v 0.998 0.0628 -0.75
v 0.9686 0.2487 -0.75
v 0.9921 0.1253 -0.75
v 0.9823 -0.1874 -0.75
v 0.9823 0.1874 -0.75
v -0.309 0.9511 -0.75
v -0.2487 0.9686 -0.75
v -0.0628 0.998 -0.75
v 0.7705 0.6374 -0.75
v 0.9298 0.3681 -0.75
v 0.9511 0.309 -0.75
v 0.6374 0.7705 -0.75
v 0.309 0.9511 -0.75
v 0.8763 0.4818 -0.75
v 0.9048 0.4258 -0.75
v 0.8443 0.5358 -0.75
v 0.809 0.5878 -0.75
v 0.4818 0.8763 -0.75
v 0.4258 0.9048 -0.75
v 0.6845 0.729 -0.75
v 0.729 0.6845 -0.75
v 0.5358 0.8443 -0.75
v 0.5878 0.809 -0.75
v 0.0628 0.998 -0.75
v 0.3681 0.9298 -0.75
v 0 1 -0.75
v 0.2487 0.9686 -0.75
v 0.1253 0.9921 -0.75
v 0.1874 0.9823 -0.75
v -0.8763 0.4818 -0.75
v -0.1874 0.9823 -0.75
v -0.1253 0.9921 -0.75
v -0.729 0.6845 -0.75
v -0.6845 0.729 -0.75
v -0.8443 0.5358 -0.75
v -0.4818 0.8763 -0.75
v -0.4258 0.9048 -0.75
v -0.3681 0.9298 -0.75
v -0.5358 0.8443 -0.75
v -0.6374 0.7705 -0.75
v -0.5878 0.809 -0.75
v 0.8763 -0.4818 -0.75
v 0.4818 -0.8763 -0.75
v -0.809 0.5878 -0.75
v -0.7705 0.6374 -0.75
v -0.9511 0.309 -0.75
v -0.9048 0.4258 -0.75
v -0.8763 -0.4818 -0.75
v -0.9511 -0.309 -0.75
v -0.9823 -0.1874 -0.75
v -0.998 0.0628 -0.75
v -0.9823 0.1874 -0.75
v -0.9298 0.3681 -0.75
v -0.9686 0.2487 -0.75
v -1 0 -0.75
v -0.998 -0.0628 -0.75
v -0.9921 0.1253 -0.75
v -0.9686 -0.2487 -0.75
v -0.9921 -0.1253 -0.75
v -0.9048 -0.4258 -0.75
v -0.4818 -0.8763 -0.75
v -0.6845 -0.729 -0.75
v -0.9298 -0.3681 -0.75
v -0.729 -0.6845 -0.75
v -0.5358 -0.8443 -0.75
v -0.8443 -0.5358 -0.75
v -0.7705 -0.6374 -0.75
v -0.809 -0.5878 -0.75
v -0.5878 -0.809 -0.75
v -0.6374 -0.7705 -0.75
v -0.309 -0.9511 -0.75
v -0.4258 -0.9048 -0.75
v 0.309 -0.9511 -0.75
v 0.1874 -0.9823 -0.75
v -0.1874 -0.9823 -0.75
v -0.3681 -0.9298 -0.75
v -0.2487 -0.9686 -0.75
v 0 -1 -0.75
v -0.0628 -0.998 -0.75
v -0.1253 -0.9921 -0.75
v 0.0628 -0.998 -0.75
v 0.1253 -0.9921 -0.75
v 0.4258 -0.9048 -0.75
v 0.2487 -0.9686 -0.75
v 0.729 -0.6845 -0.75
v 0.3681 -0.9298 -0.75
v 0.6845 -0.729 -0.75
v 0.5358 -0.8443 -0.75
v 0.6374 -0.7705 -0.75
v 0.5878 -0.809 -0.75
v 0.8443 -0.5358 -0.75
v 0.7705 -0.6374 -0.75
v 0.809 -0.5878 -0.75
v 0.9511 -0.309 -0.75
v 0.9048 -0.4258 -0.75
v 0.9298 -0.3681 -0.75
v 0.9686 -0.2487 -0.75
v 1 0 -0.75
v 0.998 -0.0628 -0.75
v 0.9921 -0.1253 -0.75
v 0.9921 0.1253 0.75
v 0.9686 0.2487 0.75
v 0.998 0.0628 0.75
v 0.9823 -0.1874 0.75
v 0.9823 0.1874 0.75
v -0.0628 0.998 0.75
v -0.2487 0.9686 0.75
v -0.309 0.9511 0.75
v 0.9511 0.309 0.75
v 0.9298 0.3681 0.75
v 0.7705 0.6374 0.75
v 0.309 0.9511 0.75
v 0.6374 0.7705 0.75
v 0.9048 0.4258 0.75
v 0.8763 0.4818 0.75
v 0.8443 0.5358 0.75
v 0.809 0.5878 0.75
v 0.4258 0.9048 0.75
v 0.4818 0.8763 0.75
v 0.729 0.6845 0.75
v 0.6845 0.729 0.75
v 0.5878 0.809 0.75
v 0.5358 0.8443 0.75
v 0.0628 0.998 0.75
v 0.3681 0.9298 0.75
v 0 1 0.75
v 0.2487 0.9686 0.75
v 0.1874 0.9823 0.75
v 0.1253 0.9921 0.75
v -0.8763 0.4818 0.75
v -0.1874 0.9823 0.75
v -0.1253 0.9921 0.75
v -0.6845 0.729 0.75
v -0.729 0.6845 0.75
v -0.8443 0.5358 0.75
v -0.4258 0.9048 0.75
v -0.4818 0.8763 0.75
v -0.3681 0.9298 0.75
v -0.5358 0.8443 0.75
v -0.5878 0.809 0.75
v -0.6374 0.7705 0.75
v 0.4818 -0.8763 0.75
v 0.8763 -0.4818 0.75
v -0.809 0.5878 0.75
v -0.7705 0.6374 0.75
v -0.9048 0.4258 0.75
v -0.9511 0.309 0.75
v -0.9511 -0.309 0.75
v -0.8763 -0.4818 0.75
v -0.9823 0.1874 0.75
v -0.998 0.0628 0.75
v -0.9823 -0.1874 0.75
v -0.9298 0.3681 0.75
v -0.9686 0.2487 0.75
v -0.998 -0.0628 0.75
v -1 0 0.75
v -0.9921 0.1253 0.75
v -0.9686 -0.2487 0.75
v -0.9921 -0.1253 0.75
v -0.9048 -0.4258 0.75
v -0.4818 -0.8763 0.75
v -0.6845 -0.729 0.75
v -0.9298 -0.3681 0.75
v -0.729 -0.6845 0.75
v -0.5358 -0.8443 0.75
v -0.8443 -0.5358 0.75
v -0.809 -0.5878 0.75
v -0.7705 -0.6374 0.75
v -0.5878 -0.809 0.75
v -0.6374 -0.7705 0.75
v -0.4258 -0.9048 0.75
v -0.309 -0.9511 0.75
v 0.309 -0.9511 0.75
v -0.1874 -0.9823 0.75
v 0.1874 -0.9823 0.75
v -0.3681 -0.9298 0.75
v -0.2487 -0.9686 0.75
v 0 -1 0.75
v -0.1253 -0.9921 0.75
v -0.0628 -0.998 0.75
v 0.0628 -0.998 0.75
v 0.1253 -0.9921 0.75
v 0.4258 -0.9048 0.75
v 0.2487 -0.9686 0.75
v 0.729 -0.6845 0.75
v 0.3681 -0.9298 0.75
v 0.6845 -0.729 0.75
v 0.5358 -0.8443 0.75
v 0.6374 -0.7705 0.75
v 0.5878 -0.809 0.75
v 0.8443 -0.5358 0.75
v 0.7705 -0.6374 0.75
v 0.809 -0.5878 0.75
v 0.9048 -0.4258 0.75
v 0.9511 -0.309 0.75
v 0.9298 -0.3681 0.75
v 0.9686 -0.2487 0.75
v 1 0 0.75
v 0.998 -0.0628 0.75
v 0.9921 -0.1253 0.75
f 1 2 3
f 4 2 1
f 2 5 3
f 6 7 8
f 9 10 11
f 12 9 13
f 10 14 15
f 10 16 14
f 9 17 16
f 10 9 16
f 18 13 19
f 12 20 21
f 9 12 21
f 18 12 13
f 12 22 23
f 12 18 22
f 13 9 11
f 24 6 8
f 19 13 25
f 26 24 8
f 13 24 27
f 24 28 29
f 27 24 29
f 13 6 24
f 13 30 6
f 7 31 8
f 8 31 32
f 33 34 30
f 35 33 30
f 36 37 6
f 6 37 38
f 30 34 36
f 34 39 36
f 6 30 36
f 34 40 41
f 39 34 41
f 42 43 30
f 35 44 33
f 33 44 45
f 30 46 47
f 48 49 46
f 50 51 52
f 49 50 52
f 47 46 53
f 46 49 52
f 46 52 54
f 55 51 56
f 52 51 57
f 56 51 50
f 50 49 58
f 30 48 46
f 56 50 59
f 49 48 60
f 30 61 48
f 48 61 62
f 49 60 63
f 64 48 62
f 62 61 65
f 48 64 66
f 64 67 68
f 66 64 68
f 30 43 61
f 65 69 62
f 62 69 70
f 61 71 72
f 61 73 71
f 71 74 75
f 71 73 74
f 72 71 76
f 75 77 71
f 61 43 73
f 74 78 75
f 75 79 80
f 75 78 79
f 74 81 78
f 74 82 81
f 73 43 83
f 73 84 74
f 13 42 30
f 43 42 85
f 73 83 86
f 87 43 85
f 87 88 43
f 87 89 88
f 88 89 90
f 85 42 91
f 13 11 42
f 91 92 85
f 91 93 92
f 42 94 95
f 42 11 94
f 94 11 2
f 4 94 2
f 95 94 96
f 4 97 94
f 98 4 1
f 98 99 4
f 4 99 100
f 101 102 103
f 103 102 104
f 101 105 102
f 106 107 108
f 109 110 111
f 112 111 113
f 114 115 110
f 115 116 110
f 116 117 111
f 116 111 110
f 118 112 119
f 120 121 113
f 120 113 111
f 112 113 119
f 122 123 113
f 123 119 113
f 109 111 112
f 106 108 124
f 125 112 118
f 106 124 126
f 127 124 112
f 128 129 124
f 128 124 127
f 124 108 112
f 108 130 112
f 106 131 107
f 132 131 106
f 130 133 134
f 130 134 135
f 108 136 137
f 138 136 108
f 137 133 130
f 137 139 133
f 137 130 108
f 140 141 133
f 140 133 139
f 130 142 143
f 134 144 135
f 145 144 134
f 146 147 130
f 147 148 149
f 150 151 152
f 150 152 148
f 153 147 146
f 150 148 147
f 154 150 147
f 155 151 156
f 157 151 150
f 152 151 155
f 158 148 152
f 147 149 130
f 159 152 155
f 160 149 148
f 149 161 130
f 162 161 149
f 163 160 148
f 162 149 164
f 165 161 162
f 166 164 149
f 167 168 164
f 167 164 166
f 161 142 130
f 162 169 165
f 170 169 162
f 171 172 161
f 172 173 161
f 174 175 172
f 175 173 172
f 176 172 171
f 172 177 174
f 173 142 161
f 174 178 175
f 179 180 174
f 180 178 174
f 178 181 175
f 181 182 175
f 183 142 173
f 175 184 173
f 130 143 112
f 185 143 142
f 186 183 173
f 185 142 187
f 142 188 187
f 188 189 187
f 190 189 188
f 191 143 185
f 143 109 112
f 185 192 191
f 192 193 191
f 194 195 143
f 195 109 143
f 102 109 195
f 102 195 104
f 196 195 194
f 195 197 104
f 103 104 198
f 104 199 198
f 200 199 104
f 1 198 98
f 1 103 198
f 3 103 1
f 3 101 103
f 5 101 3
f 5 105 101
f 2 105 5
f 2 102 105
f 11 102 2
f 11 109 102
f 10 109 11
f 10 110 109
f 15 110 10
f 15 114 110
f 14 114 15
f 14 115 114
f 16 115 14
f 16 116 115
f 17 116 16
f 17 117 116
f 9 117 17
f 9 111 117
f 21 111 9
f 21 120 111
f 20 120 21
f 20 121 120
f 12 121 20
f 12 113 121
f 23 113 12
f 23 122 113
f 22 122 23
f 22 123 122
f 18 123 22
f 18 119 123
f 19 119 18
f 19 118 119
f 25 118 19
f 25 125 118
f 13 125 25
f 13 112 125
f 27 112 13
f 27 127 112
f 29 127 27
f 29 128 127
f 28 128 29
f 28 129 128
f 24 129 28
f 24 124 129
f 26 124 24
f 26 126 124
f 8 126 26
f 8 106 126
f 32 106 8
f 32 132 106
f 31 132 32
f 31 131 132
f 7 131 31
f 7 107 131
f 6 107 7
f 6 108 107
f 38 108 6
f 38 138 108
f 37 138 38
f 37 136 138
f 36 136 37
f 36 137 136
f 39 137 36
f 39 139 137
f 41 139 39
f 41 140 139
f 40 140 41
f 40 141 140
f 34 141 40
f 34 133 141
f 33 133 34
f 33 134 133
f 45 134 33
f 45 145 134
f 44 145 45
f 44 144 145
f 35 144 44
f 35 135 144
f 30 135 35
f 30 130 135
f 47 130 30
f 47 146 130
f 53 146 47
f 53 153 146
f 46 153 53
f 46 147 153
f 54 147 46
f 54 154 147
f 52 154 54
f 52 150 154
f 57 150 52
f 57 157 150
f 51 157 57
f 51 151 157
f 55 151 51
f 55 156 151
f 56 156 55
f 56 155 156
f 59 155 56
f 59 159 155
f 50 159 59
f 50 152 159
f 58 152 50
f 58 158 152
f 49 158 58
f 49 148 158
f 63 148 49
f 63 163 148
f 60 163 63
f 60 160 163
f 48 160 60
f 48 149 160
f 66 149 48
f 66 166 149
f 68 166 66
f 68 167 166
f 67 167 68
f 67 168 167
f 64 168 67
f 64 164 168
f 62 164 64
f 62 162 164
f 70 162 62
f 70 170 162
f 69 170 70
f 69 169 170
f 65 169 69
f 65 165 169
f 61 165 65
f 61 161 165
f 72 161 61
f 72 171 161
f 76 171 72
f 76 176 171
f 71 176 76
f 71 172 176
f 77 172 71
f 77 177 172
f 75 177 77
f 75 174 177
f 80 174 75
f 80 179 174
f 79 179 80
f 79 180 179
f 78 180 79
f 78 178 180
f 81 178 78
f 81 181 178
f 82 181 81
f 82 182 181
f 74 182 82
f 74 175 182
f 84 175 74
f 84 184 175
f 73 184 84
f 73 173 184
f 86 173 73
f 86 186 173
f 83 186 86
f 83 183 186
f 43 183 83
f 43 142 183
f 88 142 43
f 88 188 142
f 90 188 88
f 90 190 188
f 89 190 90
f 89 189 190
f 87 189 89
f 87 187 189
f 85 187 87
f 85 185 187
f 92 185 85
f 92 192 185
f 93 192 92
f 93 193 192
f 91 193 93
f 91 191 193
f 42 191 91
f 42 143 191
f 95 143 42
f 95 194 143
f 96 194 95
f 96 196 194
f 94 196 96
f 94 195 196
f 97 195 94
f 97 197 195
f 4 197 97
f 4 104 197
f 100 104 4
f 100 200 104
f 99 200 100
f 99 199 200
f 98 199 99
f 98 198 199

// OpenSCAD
$fn=100;
linear_extrude(height=1.5, center=true) circle(r=1);
